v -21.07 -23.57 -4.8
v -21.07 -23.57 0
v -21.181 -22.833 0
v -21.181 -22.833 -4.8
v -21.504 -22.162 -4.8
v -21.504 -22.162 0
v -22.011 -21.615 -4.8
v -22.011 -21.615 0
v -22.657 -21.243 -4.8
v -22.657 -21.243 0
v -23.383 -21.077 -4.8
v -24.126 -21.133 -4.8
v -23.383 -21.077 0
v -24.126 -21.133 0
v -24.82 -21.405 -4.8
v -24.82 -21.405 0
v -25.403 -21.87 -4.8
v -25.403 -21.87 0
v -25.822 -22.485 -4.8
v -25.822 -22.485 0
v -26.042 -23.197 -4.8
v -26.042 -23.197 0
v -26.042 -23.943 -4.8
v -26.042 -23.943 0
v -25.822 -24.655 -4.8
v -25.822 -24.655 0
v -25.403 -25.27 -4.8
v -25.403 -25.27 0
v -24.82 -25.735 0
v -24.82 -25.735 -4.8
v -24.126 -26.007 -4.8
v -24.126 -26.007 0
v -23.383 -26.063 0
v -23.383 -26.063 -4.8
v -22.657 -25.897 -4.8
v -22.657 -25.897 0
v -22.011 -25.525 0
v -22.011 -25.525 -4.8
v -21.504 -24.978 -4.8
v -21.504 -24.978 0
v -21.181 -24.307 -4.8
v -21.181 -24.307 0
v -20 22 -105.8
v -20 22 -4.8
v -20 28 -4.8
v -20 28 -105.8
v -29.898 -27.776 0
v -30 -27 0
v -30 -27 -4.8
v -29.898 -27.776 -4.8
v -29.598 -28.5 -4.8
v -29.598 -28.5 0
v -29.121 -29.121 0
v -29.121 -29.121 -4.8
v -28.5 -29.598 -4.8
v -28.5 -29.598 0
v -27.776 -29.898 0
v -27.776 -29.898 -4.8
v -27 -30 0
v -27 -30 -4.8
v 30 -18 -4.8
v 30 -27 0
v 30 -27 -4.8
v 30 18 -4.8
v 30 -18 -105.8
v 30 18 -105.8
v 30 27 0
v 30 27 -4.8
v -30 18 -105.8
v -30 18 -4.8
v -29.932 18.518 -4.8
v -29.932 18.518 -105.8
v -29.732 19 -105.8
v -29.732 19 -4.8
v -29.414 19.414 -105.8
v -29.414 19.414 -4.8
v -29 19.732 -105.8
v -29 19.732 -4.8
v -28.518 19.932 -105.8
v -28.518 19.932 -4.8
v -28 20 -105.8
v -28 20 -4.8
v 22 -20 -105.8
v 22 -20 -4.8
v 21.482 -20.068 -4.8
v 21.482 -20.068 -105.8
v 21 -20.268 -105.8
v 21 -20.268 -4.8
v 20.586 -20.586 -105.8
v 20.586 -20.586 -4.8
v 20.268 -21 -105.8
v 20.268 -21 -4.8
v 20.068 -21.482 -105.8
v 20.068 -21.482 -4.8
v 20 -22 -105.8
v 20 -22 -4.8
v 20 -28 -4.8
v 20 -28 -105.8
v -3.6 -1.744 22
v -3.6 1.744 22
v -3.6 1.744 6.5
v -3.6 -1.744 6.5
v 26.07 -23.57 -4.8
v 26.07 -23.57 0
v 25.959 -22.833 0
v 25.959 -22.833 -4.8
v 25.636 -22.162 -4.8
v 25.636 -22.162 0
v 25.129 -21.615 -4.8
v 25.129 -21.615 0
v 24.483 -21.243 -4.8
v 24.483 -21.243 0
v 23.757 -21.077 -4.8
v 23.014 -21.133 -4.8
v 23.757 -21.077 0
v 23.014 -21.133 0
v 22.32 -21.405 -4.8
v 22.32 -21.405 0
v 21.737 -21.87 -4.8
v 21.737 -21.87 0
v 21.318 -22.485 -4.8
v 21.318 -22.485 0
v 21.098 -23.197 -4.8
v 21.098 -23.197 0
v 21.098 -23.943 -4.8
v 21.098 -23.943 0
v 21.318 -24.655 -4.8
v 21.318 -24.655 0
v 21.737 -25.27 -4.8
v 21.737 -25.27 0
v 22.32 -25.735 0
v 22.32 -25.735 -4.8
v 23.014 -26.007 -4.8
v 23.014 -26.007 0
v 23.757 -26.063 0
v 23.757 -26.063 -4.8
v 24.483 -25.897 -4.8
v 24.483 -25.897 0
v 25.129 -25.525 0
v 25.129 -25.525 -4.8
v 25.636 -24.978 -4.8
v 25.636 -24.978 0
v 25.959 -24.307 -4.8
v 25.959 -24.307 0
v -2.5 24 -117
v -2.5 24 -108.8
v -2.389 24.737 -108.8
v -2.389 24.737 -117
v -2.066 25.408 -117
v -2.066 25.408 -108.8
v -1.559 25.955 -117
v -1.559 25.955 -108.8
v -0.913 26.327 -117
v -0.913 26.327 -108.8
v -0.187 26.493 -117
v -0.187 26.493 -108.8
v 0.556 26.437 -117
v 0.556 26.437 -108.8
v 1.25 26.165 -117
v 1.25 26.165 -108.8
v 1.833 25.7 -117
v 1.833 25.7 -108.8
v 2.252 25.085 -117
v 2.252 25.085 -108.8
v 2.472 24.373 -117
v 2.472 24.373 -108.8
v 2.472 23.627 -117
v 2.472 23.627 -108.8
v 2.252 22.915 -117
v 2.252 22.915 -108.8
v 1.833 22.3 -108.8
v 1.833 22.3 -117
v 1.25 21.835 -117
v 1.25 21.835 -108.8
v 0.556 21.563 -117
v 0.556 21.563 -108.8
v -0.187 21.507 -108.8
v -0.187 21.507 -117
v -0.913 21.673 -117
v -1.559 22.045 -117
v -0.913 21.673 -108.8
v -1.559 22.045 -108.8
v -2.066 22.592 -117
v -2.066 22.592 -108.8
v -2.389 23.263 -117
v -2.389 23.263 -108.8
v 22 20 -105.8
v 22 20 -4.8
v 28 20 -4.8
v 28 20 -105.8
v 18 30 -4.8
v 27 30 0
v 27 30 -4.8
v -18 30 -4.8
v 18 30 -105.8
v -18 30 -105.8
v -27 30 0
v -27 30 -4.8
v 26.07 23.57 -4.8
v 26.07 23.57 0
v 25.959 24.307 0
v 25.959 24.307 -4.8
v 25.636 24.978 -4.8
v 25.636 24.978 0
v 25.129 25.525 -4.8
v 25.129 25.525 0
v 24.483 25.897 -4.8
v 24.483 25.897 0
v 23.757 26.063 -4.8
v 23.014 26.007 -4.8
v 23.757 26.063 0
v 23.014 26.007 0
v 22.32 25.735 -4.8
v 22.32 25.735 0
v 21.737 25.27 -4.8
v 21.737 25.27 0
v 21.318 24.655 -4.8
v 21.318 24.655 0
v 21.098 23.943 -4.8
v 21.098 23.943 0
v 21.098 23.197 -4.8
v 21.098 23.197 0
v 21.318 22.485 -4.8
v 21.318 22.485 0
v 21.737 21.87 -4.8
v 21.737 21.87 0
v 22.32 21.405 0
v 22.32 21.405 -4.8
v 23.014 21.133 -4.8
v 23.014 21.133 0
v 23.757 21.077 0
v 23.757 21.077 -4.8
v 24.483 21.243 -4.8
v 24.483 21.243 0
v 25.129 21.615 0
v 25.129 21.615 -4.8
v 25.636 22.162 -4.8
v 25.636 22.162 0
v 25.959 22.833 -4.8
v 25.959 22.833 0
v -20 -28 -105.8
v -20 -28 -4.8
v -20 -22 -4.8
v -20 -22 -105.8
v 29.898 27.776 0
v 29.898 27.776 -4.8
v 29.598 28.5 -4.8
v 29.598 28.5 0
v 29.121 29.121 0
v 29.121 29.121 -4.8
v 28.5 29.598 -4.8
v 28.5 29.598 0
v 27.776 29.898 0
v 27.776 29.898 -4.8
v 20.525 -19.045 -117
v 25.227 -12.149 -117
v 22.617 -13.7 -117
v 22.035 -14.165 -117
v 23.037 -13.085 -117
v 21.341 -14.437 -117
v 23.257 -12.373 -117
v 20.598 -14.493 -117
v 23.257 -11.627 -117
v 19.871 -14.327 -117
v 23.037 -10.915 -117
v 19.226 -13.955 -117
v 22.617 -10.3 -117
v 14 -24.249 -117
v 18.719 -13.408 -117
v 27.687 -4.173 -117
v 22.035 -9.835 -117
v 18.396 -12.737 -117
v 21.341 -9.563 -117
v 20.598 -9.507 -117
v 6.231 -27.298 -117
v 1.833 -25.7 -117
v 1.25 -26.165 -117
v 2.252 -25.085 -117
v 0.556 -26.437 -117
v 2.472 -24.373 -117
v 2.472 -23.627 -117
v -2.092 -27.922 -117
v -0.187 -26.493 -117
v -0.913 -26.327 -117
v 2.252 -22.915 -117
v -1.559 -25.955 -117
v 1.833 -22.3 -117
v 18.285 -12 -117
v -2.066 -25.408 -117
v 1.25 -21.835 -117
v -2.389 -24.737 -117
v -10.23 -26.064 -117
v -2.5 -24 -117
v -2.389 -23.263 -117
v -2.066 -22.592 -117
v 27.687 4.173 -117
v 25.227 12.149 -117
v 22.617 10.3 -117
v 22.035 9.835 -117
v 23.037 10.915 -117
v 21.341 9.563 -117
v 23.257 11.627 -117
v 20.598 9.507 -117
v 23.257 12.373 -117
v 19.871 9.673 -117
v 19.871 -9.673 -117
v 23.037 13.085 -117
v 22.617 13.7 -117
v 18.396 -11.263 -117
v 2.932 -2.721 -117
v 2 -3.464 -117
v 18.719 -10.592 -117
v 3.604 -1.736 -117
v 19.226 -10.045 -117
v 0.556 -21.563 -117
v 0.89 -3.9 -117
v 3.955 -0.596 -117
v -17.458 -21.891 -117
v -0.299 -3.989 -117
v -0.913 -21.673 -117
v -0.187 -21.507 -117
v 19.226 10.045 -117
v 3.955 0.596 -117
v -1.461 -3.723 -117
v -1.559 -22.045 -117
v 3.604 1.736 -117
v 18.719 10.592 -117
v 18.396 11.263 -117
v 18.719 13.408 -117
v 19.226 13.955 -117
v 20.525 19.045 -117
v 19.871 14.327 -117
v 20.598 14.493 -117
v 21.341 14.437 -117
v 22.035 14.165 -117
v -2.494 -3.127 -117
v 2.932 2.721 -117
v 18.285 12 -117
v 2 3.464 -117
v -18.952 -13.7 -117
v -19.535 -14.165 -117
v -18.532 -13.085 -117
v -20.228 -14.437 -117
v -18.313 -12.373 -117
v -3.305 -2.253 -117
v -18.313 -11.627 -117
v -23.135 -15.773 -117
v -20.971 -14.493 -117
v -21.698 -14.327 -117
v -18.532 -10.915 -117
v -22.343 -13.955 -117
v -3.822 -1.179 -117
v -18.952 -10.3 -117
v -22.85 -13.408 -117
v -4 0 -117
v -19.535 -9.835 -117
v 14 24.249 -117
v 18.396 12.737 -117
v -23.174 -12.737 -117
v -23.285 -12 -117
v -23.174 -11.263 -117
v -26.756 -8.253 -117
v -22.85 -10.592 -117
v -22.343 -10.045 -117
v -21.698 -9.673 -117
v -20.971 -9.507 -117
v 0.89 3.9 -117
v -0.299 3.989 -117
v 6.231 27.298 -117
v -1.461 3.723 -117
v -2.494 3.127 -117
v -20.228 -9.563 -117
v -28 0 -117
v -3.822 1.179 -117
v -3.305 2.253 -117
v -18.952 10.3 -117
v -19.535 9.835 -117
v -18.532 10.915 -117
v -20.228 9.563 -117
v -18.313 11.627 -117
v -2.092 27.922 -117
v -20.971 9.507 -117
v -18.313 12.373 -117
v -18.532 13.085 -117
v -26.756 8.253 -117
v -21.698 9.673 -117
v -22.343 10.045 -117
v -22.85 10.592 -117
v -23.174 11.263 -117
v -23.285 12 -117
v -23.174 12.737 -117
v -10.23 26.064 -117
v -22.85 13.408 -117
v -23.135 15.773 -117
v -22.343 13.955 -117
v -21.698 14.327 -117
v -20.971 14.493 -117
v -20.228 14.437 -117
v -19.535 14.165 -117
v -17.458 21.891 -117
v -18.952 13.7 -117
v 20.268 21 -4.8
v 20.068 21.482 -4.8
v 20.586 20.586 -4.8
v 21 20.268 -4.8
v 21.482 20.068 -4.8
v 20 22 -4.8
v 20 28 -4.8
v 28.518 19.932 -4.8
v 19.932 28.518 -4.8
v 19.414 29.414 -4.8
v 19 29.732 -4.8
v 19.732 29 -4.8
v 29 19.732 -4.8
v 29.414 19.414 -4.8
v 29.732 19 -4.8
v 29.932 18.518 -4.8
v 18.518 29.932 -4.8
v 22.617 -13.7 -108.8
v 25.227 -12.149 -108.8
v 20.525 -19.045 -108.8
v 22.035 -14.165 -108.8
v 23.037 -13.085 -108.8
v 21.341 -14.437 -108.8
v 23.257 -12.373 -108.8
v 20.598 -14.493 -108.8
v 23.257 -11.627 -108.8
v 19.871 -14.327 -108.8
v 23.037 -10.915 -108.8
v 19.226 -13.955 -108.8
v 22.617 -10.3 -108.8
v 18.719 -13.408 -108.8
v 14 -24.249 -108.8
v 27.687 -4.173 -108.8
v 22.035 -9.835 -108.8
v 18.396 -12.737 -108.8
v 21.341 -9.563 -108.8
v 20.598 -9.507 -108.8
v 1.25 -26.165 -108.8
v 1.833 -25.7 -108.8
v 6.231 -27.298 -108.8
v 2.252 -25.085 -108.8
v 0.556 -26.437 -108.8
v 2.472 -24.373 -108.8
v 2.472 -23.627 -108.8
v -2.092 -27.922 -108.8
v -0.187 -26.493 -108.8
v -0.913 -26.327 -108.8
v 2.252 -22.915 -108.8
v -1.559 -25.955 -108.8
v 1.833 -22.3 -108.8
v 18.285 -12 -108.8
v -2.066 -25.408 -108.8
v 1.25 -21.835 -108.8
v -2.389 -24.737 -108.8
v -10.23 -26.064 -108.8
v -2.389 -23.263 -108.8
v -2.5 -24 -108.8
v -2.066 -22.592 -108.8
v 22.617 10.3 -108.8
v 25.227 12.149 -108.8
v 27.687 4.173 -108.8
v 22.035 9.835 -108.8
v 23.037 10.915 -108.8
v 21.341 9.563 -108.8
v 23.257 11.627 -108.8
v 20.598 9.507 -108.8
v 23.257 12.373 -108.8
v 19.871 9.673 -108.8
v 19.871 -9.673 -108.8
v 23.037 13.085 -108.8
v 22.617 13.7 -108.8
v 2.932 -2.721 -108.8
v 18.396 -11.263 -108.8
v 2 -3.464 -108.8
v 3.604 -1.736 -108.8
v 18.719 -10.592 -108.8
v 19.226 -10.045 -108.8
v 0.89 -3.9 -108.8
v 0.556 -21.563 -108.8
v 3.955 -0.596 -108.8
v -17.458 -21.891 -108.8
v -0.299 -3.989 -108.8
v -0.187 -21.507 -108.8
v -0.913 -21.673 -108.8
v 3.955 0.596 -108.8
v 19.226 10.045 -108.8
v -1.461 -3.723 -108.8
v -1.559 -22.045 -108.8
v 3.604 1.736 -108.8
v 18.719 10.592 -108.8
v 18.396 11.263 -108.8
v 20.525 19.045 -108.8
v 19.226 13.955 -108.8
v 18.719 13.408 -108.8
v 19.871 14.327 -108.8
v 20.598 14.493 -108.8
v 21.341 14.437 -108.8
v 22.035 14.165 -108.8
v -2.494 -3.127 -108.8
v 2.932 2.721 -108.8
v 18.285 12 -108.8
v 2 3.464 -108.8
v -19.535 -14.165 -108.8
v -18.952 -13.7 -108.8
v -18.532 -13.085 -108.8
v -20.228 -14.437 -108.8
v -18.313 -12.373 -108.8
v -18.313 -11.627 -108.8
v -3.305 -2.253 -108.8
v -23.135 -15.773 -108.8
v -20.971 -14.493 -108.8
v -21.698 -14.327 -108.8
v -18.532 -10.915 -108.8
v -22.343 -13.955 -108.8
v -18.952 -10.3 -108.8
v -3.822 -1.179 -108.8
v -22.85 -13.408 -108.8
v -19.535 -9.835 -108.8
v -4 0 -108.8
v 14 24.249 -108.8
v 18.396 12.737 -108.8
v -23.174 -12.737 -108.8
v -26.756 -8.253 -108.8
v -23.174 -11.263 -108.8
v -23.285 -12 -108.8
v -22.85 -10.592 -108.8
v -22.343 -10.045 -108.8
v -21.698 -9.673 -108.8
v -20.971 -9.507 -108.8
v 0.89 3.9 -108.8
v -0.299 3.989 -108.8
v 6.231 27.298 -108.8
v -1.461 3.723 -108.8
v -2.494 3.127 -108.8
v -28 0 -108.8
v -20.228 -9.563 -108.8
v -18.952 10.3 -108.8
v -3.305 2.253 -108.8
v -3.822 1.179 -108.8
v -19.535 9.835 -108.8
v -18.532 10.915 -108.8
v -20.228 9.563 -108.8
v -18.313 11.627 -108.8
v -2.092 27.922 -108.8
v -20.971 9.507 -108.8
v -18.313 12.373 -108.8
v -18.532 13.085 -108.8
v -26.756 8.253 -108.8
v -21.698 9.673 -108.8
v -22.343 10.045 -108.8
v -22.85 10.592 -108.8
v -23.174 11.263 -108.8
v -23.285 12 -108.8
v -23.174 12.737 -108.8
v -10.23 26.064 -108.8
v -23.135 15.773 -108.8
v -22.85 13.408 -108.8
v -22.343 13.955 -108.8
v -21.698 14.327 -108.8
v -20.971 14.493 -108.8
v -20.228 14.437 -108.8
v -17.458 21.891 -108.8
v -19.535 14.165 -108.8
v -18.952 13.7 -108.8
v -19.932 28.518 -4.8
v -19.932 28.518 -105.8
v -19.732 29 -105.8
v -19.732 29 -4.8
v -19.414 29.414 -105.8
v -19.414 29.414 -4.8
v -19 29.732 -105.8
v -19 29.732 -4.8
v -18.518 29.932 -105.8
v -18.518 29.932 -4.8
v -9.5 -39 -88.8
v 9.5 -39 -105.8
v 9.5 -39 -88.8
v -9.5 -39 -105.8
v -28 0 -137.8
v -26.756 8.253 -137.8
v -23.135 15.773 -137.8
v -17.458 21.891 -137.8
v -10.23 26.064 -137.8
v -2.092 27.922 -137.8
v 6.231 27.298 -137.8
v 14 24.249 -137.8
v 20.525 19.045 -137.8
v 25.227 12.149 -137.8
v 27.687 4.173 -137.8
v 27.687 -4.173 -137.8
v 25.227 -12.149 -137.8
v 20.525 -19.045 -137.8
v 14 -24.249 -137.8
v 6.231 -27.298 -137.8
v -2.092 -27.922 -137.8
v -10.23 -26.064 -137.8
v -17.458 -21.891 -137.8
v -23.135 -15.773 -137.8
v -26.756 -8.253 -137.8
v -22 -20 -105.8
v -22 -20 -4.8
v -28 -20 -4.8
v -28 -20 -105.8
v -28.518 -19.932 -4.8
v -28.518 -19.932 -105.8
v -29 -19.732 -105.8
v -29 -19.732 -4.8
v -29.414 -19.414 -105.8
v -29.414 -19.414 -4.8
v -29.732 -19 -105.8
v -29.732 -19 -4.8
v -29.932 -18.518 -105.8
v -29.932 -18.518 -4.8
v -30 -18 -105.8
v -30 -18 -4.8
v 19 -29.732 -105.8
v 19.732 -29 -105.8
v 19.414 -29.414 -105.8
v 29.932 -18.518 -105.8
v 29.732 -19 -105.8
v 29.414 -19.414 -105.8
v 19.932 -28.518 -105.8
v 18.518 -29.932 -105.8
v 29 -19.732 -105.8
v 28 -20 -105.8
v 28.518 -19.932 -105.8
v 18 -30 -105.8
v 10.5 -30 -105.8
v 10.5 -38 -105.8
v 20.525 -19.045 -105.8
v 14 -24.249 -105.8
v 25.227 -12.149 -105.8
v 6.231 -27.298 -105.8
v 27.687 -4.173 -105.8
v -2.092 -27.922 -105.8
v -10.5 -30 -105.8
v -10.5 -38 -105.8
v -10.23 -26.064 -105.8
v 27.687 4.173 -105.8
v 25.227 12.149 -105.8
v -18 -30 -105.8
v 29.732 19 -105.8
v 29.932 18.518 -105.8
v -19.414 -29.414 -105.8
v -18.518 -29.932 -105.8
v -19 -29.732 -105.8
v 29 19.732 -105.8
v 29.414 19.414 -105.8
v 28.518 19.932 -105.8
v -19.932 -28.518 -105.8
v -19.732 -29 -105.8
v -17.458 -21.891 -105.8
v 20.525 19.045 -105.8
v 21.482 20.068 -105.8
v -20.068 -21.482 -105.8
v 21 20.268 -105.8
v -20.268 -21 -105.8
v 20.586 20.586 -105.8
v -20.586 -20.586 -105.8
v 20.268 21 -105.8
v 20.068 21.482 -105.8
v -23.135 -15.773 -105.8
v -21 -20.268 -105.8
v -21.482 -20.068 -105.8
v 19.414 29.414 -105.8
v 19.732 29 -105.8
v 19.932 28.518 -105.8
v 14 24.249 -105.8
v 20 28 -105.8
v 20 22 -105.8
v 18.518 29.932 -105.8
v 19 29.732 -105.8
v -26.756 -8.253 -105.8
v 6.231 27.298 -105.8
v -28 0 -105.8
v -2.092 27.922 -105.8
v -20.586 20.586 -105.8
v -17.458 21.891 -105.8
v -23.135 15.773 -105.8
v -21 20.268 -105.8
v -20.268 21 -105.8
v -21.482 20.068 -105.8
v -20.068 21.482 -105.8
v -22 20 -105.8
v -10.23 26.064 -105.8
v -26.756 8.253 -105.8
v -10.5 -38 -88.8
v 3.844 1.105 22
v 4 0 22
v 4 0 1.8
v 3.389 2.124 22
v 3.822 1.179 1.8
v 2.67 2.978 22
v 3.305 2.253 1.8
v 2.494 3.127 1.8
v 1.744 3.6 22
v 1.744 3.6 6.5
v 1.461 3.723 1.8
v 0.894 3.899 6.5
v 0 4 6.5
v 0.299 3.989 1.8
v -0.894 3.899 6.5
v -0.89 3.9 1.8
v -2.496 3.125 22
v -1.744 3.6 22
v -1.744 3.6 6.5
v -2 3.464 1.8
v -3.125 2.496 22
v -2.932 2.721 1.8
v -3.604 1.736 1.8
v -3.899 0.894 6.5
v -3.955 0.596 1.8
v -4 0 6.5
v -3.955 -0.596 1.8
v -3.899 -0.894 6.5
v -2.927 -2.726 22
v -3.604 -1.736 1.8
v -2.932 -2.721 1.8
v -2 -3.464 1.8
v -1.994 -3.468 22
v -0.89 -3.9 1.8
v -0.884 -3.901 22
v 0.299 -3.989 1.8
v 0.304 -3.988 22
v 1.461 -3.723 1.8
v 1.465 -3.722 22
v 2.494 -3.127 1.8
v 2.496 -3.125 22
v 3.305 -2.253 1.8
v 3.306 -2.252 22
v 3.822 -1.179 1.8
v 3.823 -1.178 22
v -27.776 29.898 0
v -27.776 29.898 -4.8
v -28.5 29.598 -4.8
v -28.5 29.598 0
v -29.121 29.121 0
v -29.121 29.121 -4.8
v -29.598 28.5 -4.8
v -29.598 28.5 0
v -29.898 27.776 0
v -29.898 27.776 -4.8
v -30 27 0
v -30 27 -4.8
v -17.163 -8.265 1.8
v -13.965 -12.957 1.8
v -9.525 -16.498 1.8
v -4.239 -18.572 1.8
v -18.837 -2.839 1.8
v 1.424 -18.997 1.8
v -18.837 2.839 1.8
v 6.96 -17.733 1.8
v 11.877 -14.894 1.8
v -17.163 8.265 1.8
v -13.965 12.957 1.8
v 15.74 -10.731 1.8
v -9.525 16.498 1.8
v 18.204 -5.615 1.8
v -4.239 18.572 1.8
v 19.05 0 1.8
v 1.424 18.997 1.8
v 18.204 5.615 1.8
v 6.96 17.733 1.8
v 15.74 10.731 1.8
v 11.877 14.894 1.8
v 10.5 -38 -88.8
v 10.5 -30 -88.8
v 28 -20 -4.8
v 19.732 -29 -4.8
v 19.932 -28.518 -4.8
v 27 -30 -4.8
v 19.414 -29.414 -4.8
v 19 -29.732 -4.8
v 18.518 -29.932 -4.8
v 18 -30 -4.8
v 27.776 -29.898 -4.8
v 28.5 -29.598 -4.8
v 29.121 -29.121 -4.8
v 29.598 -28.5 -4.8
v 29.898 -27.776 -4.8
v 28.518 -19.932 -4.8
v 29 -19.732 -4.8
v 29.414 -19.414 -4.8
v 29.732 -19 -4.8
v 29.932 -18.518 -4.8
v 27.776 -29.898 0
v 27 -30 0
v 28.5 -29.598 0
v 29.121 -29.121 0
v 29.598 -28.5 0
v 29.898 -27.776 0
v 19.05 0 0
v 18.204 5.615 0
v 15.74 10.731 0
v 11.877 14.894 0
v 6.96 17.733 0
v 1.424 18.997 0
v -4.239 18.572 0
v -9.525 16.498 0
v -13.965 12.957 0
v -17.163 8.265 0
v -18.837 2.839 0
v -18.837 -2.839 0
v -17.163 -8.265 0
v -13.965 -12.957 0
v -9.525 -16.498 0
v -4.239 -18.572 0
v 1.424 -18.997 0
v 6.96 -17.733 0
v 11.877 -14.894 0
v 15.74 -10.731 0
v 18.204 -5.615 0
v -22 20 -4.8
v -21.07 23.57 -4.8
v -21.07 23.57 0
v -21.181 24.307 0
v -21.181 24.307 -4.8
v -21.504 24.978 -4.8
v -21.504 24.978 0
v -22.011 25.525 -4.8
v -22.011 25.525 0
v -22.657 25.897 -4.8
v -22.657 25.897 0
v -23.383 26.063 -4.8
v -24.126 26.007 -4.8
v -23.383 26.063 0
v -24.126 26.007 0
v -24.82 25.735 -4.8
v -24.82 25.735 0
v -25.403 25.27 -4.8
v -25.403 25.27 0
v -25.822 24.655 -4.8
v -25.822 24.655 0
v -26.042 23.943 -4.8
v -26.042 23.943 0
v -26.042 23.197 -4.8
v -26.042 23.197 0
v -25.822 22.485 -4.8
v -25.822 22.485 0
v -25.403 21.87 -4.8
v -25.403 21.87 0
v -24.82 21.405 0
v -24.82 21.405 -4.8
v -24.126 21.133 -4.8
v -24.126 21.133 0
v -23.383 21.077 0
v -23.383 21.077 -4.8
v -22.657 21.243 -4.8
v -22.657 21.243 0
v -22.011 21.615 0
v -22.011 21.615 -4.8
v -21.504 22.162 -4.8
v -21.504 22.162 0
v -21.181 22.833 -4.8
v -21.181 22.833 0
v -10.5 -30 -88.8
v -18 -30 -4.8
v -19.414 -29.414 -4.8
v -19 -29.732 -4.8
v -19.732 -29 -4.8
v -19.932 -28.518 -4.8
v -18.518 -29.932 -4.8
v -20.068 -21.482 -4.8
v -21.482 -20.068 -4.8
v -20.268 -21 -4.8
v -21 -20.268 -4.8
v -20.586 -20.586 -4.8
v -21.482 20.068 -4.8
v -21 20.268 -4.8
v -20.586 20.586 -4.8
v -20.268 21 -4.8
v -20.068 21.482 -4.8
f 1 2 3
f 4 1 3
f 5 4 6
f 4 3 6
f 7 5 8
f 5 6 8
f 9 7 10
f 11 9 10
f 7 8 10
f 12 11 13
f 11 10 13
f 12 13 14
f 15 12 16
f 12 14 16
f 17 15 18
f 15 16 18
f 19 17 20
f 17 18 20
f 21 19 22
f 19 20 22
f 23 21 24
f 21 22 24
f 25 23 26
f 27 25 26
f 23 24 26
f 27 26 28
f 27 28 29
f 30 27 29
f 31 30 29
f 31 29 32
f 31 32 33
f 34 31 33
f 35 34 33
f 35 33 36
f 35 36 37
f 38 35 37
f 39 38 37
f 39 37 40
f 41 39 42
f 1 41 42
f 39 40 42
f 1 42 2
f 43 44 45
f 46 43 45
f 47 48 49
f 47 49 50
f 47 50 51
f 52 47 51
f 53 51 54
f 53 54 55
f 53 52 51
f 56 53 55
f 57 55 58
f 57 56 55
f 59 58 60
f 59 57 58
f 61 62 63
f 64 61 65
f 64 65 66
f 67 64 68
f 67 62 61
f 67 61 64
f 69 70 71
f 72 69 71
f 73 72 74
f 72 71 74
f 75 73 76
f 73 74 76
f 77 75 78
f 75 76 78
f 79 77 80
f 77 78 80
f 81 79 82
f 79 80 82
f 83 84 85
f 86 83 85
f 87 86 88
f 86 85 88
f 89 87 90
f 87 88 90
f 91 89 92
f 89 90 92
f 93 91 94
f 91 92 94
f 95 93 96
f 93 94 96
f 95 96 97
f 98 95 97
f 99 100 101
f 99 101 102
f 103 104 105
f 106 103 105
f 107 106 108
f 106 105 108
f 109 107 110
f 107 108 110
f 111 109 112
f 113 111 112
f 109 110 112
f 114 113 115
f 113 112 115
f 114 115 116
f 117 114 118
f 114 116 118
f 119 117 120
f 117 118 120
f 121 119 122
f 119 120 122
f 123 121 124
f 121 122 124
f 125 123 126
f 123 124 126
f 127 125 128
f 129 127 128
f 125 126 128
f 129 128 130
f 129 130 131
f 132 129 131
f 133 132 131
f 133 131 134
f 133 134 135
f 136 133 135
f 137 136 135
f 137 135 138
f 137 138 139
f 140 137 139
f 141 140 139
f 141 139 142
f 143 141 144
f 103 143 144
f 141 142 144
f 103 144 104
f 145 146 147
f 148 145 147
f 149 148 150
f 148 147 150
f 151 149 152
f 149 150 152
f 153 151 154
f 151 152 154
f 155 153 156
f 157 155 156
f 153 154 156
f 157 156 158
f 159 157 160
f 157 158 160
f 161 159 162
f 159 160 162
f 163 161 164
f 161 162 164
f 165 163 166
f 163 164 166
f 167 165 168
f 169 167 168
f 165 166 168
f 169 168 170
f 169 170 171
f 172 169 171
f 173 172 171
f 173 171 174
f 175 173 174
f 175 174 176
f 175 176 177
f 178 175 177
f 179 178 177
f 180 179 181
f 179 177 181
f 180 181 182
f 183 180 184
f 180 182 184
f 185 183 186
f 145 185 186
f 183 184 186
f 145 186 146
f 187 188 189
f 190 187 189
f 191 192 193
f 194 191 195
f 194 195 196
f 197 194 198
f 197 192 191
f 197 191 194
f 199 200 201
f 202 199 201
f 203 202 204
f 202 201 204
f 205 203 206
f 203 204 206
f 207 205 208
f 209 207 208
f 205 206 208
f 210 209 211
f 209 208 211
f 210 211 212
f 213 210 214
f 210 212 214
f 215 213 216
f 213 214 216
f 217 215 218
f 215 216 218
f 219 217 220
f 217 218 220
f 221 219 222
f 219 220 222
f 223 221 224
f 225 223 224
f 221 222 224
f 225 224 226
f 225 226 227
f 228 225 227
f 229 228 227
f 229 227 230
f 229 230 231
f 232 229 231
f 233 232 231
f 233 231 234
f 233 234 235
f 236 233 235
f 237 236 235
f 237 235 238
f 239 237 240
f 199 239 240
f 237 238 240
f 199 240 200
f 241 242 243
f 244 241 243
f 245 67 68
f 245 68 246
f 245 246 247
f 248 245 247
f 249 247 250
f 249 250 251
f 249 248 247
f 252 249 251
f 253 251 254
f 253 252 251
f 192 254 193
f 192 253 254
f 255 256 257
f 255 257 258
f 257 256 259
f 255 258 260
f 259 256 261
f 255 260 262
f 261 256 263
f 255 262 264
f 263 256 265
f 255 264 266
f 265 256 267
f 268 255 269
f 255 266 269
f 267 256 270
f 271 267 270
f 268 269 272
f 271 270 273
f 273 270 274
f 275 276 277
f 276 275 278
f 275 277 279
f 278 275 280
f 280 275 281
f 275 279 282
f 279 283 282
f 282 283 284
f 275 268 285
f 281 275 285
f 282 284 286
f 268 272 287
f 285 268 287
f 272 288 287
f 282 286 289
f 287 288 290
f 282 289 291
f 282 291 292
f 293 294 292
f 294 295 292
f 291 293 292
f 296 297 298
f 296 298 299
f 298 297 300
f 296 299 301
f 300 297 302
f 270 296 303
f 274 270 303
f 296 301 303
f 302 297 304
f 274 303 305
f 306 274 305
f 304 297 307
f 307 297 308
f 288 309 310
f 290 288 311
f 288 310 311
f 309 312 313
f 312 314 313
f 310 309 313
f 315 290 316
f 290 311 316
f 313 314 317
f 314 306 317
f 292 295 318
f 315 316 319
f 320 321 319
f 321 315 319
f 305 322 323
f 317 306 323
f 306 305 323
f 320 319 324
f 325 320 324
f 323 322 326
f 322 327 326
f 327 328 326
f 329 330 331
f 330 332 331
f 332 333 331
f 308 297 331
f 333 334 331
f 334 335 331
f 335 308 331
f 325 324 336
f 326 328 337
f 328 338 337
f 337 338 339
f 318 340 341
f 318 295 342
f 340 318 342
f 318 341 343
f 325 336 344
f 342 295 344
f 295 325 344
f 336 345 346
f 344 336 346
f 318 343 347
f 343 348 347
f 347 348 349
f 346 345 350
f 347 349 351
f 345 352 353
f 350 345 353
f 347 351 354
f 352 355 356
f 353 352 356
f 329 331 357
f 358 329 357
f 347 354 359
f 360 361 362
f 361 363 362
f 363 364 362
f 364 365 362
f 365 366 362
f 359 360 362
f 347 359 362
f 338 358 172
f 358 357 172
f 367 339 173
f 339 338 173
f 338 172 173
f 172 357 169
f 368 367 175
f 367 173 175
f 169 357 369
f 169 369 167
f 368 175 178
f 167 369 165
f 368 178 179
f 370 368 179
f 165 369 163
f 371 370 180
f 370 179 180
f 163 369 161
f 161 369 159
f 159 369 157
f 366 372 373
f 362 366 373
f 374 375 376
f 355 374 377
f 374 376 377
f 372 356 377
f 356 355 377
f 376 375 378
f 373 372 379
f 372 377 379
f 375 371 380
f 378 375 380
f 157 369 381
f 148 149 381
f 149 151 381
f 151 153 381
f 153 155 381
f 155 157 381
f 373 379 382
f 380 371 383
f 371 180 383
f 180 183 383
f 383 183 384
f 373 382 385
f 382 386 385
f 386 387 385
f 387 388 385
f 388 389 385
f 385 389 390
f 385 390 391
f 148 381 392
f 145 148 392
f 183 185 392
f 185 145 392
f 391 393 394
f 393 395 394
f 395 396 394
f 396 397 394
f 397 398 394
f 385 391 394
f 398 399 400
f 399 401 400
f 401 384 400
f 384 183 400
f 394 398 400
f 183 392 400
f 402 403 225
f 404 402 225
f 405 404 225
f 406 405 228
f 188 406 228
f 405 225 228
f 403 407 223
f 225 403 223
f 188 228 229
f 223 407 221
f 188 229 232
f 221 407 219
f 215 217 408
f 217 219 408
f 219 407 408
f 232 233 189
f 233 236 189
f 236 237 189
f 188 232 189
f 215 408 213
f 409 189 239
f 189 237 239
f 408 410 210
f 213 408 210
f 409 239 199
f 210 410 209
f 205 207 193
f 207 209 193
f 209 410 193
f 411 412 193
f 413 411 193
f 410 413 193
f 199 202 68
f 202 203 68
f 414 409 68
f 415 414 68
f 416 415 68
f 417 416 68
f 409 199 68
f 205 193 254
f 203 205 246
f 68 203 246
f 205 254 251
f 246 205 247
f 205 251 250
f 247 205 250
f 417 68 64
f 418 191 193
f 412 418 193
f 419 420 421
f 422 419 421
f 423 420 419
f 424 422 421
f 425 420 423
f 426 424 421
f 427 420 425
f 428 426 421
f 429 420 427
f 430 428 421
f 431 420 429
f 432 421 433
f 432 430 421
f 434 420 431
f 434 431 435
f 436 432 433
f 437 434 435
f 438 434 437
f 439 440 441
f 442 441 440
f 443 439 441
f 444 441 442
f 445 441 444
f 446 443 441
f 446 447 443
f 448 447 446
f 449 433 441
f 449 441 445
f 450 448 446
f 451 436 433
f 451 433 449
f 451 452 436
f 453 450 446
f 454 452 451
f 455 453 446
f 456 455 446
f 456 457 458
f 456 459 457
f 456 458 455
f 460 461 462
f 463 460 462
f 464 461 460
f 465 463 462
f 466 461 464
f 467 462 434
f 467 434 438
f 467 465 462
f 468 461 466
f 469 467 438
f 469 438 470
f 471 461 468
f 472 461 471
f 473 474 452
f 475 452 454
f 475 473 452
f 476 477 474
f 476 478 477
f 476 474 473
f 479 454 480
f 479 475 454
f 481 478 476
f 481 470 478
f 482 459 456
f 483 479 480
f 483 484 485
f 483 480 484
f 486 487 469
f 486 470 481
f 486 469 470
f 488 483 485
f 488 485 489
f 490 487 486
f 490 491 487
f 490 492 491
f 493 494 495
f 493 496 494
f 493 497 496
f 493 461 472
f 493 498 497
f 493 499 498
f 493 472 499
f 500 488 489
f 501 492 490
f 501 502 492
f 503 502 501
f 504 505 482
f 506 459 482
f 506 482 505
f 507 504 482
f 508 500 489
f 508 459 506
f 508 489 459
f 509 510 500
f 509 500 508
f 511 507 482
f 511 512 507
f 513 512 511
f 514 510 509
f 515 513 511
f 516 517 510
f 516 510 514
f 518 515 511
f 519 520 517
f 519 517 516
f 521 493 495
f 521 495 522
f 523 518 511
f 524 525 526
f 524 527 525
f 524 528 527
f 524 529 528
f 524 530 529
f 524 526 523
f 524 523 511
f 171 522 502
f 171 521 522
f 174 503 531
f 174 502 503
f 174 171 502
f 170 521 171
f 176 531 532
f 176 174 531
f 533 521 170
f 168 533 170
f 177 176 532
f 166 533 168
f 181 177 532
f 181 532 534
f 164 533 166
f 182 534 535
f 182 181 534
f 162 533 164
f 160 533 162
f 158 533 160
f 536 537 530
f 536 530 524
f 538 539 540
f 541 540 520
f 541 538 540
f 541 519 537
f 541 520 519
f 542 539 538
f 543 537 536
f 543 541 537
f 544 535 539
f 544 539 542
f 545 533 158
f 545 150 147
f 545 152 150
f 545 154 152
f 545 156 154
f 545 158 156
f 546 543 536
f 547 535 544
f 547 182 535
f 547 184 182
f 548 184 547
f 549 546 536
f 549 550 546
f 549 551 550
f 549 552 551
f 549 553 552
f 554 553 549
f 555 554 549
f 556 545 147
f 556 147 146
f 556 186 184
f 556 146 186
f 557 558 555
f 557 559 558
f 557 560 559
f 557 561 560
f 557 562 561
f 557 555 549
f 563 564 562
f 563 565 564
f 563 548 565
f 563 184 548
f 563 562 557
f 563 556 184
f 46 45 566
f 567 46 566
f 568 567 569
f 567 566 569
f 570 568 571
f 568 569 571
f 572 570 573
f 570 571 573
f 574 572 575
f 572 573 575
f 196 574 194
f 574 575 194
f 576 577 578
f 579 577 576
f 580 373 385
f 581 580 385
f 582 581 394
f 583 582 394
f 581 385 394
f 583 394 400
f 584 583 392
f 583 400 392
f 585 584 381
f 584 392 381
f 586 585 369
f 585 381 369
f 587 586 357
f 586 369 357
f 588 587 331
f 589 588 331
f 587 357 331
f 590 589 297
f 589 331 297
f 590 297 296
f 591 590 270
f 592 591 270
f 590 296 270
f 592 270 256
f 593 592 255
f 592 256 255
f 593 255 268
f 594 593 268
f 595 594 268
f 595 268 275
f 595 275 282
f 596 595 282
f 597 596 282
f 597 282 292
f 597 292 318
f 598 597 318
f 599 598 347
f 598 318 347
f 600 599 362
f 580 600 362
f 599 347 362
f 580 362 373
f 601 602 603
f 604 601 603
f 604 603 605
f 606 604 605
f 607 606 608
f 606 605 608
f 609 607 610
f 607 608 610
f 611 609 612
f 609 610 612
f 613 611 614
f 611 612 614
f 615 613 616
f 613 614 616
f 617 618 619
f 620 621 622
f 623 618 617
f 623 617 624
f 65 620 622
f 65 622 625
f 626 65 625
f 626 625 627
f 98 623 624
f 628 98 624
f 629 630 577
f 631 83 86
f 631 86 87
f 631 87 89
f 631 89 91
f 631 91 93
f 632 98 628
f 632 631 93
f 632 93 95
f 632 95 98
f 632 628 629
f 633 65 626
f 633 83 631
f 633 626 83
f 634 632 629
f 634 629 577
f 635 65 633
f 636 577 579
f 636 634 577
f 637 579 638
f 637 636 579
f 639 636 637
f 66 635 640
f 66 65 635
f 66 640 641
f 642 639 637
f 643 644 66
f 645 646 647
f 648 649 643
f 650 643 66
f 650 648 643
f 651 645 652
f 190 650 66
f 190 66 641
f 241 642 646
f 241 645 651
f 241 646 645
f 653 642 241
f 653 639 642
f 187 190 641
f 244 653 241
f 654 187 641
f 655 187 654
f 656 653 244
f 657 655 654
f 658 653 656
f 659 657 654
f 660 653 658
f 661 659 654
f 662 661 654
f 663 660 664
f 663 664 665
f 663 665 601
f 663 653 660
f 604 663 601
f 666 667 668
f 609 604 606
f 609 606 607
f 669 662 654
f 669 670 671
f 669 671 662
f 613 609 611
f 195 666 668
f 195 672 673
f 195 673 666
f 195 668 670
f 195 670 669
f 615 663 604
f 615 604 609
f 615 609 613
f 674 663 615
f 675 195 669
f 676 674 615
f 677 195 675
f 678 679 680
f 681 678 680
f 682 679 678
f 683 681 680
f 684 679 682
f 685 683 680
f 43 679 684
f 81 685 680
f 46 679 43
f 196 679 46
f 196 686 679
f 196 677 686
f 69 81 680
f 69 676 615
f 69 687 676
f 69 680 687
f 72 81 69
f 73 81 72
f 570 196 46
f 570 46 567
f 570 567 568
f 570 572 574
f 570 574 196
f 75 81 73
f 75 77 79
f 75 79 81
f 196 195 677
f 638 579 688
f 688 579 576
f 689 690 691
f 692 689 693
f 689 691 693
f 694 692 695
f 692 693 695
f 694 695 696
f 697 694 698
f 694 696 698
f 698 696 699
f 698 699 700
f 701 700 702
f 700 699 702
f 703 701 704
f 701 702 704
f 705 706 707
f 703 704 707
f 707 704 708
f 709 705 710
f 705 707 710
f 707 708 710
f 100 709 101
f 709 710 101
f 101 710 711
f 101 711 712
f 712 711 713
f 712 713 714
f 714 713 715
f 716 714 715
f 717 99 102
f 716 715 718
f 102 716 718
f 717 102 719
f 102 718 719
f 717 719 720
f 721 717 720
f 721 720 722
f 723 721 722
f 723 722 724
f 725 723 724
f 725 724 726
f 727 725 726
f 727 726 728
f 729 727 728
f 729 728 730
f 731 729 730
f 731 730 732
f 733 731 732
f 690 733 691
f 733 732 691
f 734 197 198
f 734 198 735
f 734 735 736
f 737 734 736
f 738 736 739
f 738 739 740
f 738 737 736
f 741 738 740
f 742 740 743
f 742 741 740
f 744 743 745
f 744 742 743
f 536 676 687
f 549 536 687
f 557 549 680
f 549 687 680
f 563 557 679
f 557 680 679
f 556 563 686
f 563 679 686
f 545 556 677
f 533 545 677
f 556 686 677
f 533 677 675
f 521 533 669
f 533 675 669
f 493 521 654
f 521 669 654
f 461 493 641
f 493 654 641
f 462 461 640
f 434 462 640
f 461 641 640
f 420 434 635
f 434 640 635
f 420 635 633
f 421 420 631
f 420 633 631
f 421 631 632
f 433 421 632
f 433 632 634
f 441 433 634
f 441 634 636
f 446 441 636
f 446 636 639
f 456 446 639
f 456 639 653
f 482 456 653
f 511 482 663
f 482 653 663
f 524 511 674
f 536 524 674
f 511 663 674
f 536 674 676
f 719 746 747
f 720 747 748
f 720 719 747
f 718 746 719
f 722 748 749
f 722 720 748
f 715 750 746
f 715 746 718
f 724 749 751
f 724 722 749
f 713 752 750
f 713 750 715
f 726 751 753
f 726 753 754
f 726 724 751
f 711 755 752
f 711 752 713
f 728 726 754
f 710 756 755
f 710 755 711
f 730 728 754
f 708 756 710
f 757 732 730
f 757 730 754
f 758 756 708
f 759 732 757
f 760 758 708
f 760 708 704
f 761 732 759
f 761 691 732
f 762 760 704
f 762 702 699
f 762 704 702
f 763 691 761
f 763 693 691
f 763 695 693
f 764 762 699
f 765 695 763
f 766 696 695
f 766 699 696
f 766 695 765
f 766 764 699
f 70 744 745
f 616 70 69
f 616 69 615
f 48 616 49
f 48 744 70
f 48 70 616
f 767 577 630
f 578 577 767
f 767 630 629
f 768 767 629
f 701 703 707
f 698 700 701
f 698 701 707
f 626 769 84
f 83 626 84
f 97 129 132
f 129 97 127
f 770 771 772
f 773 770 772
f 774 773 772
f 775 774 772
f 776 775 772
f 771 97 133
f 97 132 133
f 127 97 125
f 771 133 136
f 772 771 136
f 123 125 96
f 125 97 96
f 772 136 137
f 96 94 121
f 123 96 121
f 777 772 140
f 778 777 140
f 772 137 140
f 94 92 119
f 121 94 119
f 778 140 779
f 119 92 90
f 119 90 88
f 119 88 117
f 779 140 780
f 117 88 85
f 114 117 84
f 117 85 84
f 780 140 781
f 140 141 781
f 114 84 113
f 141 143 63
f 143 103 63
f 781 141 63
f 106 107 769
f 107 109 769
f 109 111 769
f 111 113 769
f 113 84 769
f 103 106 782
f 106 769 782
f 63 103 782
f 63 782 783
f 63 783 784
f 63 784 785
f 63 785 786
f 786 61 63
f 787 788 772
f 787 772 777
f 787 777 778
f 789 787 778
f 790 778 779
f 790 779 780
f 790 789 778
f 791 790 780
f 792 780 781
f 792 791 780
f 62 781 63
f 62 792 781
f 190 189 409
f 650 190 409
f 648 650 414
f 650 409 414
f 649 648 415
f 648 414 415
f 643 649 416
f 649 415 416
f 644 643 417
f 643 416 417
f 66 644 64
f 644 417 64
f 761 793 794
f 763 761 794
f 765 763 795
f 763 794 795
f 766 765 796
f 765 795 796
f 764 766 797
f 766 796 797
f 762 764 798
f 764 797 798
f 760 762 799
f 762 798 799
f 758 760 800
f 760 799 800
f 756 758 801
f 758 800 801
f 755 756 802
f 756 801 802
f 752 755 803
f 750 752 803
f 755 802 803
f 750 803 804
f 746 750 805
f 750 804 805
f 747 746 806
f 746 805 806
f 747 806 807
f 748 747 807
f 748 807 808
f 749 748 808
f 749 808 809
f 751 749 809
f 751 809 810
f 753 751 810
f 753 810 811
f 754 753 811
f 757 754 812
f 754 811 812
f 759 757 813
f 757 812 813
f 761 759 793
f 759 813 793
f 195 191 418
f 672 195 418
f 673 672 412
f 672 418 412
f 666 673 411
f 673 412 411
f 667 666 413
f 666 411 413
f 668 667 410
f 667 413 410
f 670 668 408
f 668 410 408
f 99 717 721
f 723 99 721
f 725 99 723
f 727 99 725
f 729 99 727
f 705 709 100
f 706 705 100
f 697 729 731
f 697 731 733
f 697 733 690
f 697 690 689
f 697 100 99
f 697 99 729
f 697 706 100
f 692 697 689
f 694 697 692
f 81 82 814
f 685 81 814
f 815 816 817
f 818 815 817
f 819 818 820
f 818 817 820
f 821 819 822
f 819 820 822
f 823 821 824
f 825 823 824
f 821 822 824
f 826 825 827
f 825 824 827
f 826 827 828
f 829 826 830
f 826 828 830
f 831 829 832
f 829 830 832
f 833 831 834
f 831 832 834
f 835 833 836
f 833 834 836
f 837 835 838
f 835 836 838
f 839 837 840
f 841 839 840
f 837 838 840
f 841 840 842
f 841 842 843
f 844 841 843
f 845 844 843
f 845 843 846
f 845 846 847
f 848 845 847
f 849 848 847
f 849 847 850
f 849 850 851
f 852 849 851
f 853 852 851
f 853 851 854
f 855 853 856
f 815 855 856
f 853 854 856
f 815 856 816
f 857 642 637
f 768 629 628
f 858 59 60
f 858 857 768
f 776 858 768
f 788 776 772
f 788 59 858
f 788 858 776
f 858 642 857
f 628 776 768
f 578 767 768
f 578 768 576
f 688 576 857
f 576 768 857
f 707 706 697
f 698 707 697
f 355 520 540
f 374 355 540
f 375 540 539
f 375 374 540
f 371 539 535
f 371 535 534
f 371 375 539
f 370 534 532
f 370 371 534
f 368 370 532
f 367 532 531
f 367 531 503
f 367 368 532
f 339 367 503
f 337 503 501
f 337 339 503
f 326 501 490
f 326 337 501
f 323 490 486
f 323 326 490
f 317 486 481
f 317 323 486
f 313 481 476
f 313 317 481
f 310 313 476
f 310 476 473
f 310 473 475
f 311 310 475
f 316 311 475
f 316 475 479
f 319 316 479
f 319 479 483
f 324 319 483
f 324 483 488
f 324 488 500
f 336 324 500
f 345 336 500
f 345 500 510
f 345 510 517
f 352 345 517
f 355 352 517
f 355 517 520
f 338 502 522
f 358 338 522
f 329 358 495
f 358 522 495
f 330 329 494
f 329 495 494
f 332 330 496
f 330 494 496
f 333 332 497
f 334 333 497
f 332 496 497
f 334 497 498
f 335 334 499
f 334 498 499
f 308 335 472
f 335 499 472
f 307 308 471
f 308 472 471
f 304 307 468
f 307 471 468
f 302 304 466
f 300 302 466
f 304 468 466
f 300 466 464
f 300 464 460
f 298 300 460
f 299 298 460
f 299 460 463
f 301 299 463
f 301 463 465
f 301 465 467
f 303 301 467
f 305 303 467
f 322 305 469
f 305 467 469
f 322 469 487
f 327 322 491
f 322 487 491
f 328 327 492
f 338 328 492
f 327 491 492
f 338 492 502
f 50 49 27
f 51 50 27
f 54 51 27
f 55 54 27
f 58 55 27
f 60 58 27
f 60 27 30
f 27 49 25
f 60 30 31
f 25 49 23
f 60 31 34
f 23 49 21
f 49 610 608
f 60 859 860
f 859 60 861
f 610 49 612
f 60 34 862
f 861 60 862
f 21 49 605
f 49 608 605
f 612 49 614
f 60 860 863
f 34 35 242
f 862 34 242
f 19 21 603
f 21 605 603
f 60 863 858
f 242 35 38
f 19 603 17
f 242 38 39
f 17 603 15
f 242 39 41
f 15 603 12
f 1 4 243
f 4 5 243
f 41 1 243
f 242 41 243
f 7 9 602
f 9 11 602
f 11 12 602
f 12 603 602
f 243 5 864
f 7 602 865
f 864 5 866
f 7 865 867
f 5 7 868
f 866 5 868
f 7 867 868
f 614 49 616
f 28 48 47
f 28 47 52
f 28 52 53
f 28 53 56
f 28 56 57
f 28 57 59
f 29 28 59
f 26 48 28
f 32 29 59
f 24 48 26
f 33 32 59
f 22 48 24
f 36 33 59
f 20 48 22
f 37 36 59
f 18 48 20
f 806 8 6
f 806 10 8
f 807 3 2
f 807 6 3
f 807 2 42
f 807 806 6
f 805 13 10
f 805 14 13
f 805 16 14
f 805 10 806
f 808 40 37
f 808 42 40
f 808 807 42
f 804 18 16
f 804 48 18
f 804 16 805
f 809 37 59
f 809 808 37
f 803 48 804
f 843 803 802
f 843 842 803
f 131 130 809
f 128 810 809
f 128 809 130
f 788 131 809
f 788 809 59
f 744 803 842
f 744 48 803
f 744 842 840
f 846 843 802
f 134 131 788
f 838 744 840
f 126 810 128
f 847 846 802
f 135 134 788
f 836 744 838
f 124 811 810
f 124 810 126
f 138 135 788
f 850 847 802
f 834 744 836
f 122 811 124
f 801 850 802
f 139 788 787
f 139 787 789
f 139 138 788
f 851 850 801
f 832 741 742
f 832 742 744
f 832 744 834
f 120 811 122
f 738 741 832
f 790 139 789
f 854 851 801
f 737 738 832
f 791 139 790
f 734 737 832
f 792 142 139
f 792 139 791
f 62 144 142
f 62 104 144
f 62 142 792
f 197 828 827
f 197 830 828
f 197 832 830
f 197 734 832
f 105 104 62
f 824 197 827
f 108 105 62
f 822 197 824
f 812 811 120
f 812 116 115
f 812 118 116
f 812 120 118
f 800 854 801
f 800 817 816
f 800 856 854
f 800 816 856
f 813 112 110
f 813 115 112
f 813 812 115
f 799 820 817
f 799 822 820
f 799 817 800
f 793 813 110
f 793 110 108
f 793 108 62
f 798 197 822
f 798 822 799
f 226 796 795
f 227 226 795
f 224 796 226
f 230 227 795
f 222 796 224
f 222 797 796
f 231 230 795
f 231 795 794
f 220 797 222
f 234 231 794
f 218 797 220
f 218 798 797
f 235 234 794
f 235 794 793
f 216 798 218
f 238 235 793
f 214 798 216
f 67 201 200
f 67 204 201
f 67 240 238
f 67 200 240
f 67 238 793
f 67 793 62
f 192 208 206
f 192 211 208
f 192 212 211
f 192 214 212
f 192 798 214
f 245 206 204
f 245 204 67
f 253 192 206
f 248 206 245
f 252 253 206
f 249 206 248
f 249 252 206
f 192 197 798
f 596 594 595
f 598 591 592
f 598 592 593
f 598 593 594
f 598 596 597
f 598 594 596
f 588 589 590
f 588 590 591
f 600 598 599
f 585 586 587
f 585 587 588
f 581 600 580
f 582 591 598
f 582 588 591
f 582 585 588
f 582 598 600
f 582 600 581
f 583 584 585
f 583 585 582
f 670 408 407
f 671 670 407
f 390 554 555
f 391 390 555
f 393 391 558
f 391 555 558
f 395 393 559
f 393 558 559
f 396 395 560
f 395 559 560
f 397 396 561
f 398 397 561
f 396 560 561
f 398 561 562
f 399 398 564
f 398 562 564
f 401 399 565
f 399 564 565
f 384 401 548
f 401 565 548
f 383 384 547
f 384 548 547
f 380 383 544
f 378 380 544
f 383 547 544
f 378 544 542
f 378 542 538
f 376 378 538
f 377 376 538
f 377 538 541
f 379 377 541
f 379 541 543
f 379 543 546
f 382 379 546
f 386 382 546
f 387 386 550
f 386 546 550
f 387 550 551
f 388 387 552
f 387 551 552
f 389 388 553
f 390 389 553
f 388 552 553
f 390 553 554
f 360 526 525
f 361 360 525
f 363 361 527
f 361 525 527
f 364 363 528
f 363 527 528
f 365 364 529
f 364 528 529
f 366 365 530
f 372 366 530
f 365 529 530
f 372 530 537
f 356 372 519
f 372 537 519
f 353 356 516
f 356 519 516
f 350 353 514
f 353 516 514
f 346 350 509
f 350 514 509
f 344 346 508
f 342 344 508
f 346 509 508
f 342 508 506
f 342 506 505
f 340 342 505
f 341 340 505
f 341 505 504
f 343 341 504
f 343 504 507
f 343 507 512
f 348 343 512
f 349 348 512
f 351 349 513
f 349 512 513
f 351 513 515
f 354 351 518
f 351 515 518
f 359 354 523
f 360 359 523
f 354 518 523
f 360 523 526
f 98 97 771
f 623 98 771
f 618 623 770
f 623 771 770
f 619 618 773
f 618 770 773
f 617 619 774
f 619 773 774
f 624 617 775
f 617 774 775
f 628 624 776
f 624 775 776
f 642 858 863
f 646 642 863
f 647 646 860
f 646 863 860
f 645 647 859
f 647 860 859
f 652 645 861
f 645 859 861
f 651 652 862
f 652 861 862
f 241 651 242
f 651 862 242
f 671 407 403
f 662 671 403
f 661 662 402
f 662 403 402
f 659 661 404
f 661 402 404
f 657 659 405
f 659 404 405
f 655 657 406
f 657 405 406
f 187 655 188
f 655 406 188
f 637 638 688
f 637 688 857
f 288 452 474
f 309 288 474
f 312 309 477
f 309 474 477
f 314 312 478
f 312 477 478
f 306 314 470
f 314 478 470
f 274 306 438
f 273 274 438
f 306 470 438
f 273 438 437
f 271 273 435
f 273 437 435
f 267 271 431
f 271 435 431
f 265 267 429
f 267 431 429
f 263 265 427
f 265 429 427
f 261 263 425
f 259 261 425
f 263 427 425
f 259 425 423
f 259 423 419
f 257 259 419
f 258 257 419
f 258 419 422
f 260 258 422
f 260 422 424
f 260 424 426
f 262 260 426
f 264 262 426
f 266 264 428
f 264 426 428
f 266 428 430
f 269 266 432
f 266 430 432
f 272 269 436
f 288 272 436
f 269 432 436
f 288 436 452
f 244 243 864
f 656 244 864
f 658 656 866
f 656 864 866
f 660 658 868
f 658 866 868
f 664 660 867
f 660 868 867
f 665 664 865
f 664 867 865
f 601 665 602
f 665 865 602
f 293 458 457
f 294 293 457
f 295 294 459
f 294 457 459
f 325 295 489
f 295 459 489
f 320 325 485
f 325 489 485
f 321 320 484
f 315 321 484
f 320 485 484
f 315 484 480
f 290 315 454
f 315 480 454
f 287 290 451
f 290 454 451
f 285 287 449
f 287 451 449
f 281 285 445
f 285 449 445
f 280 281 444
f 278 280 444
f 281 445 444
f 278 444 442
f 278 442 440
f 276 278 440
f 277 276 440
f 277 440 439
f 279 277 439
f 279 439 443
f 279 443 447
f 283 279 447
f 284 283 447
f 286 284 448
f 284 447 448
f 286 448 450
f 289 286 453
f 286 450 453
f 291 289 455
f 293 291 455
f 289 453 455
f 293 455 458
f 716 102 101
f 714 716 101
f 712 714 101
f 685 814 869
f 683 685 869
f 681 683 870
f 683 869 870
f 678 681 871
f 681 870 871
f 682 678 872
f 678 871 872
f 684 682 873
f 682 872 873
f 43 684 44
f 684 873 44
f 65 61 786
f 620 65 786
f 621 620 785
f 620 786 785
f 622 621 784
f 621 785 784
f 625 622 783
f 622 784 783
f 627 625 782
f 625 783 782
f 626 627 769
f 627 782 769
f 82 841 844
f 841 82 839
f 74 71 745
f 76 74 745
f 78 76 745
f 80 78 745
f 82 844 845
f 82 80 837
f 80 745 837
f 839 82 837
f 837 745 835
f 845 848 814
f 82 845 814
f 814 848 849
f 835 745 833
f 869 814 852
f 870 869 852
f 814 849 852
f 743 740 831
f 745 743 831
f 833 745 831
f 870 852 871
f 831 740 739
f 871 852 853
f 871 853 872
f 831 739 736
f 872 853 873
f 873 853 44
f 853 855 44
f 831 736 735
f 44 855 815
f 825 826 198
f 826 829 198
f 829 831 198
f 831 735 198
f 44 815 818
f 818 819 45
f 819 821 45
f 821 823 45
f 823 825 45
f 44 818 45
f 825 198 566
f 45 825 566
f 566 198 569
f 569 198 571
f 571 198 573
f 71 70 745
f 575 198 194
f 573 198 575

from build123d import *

# Parameters (mm, degrees)
SKETCH1_R           = 2.5
BOSS_EXTRUDE1_DEPTH = 4.8
BOSS_EXTRUDE2_DEPTH = 101
SKETCH4_R           = 19.05
BOSS_EXTRUDE3_DEPTH = 1.8
SKETCH5_R           = 4
BOSS_EXTRUDE4_DEPTH = 20.2
CUT_EXTRUDE1_DEPTH  = 15.5
SKETCH8_R           = 28
BOSS_EXTRUDE5_DEPTH = 3
SKETCH9_R           = 2.5
BOSS_EXTRUDE6_DEPTH = 8.2
SKETCH10_R          = 28
BOSS_EXTRUDE7_DEPTH = 20.8
SKETCH11_W          = 21
SKETCH11_H          = 9
BOSS_EXTRUDE8_DEPTH = 17
CHAMFER1_SIZE       = 1
SKETCH12_R          = 4
BOSS_EXTRUDE9_DEPTH = 29


with BuildPart() as part:
    # Sketch1 → Boss-Extrude1 (new body)
    with BuildSketch(Plane.XY):
        with BuildLine():
            Line((-27, -30), (27, -30))
            ThreePointArc((27, -30), (29.121320344, -29.121320344), (30, -27))
            Line((30, -27), (30, 27))
            ThreePointArc((30, 27), (29.121320344, 29.121320344), (27, 30))
            Line((27, 30), (-27, 30))
            ThreePointArc((-27, 30), (-29.121320344, 29.121320344), (-30, 27))
            Line((-30, 27), (-30, -27))
            ThreePointArc((-30, -27), (-29.121320344, -29.121320344), (-27, -30))
        make_face()
        with Locations((-23.57, 23.57)):
            Circle(SKETCH1_R, mode=Mode.SUBTRACT)
        with Locations((23.57, 23.57)):
            Circle(SKETCH1_R, mode=Mode.SUBTRACT)
        with Locations((23.57, -23.57)):
            Circle(SKETCH1_R, mode=Mode.SUBTRACT)
        with Locations((-23.57, -23.57)):
            Circle(SKETCH1_R, mode=Mode.SUBTRACT)
    extrude(amount=-BOSS_EXTRUDE1_DEPTH)

    # Sketch3 → Boss-Extrude2 (add)
    with BuildSketch(Plane(origin=(0, 0, -4.8), x_dir=(-1, 0, 0), z_dir=(0, 0, -1))):
        with BuildLine():
            Line((18, 30), (-18, 30))
            ThreePointArc((-18, 30), (-19.414213562, 29.414213562), (-20, 28))
            Line((-20, 28), (-20, 22))
            ThreePointArc((-20, 22), (-20.585786438, 20.585786438), (-22, 20))
            Line((-22, 20), (-28, 20))
            ThreePointArc((-28, 20), (-29.414213562, 19.414213562), (-30, 18))
            Line((-30, 18), (-30, -18))
            ThreePointArc((-30, -18), (-29.414213562, -19.414213562), (-28, -20))
            Line((-28, -20), (-22, -20))
            ThreePointArc((-22, -20), (-20.585786438, -20.585786438), (-20, -22))
            Line((-20, -22), (-20, -28))
            ThreePointArc((-20, -28), (-19.414213562, -29.414213562), (-18, -30))
            Line((-18, -30), (18, -30))
            ThreePointArc((18, -30), (19.414213562, -29.414213562), (20, -28))
            Line((20, -28), (20, -22))
            ThreePointArc((20, -22), (20.585786438, -20.585786438), (22, -20))
            Line((22, -20), (28, -20))
            ThreePointArc((28, -20), (29.414213562, -19.414213562), (30, -18))
            Line((30, -18), (30, 18))
            ThreePointArc((30, 18), (29.414213562, 19.414213562), (28, 20))
            Line((28, 20), (22, 20))
            ThreePointArc((22, 20), (20.585786438, 20.585786438), (20, 22))
            Line((20, 22), (20, 28))
            ThreePointArc((20, 28), (19.414213562, 29.414213562), (18, 30))
        make_face()
    extrude(amount=BOSS_EXTRUDE2_DEPTH)

    # Sketch4 → Boss-Extrude3 (add)
    with BuildSketch(Plane.XY):
        Circle(SKETCH4_R)
    extrude(amount=BOSS_EXTRUDE3_DEPTH)

    # Sketch5 → Boss-Extrude4 (add)
    with BuildSketch(Plane.XY.offset(1.8)):
        Circle(SKETCH5_R)
    extrude(amount=BOSS_EXTRUDE4_DEPTH)

    # Sketch7 → Cut-Extrude1 (cut)
    with BuildSketch(Plane.XY.offset(22)):
        with BuildLine():
            Line((-1.743559577, 3.6), (1.743559577, 3.6))
            ThreePointArc((1.743559577, 3.6), (0, 4), (-1.743559577, 3.6))
        make_face()
        with BuildLine():
            Line((-3.6, 1.743559577), (-3.6, -1.743559577))
            ThreePointArc((-3.6, -1.743559577), (-4, 0), (-3.6, 1.743559577))
        make_face()
    extrude(amount=-CUT_EXTRUDE1_DEPTH, mode=Mode.SUBTRACT)

    # Sketch8 → Boss-Extrude5 (add)
    with BuildSketch(Plane(origin=(0, 0, -105.8), x_dir=(-1, 0, 0), z_dir=(0, 0, -1))):
        Circle(SKETCH8_R)
    extrude(amount=BOSS_EXTRUDE5_DEPTH)

    # Sketch9 → Boss-Extrude6 (add)
    with BuildSketch(Plane(origin=(0, 0, -108.8), x_dir=(-1, 0, 0), z_dir=(0, 0, -1))):
        with Locations((0, 24)):
            Circle(SKETCH9_R)
        with Locations((20.784609691, 12)):
            Circle(SKETCH9_R)
        with Locations((20.784609691, -12)):
            Circle(SKETCH9_R)
        with Locations((0, -24)):
            Circle(SKETCH9_R)
        with Locations((-20.784609691, -12)):
            Circle(SKETCH9_R)
        with Locations((-20.784609691, 12)):
            Circle(SKETCH9_R)
    extrude(amount=BOSS_EXTRUDE6_DEPTH)

    # Sketch10 → Boss-Extrude7 (add)
    with BuildSketch(Plane(origin=(0, 0, -117), x_dir=(-1, 0, 0), z_dir=(0, 0, -1))):
        Circle(SKETCH10_R)
    extrude(amount=BOSS_EXTRUDE7_DEPTH)

    # Sketch11 → Boss-Extrude8 (add)
    with BuildSketch(Plane(origin=(0, 0, -105.8), x_dir=(-1, 0, 0), z_dir=(0, 0, -1))):
        with Locations((0, -34.5)):
            Rectangle(SKETCH11_W, SKETCH11_H)
    extrude(amount=-BOSS_EXTRUDE8_DEPTH)

    # Chamfer1
    chamfer1_edges = [part.edges().sort_by_distance(p)[0] for p in [
        (10.5, -39, -97.3),
        (-10.5, -39, -97.3),
    ]]
    chamfer(chamfer1_edges, length=CHAMFER1_SIZE)

    # Sketch12 → Boss-Extrude9 (add)
    with BuildSketch(Plane(origin=(0, 0, -137.8), x_dir=(-1, 0, 0), z_dir=(0, 0, -1))):
        Circle(SKETCH12_R)
    extrude(amount=-BOSS_EXTRUDE9_DEPTH)


solid = part.part
